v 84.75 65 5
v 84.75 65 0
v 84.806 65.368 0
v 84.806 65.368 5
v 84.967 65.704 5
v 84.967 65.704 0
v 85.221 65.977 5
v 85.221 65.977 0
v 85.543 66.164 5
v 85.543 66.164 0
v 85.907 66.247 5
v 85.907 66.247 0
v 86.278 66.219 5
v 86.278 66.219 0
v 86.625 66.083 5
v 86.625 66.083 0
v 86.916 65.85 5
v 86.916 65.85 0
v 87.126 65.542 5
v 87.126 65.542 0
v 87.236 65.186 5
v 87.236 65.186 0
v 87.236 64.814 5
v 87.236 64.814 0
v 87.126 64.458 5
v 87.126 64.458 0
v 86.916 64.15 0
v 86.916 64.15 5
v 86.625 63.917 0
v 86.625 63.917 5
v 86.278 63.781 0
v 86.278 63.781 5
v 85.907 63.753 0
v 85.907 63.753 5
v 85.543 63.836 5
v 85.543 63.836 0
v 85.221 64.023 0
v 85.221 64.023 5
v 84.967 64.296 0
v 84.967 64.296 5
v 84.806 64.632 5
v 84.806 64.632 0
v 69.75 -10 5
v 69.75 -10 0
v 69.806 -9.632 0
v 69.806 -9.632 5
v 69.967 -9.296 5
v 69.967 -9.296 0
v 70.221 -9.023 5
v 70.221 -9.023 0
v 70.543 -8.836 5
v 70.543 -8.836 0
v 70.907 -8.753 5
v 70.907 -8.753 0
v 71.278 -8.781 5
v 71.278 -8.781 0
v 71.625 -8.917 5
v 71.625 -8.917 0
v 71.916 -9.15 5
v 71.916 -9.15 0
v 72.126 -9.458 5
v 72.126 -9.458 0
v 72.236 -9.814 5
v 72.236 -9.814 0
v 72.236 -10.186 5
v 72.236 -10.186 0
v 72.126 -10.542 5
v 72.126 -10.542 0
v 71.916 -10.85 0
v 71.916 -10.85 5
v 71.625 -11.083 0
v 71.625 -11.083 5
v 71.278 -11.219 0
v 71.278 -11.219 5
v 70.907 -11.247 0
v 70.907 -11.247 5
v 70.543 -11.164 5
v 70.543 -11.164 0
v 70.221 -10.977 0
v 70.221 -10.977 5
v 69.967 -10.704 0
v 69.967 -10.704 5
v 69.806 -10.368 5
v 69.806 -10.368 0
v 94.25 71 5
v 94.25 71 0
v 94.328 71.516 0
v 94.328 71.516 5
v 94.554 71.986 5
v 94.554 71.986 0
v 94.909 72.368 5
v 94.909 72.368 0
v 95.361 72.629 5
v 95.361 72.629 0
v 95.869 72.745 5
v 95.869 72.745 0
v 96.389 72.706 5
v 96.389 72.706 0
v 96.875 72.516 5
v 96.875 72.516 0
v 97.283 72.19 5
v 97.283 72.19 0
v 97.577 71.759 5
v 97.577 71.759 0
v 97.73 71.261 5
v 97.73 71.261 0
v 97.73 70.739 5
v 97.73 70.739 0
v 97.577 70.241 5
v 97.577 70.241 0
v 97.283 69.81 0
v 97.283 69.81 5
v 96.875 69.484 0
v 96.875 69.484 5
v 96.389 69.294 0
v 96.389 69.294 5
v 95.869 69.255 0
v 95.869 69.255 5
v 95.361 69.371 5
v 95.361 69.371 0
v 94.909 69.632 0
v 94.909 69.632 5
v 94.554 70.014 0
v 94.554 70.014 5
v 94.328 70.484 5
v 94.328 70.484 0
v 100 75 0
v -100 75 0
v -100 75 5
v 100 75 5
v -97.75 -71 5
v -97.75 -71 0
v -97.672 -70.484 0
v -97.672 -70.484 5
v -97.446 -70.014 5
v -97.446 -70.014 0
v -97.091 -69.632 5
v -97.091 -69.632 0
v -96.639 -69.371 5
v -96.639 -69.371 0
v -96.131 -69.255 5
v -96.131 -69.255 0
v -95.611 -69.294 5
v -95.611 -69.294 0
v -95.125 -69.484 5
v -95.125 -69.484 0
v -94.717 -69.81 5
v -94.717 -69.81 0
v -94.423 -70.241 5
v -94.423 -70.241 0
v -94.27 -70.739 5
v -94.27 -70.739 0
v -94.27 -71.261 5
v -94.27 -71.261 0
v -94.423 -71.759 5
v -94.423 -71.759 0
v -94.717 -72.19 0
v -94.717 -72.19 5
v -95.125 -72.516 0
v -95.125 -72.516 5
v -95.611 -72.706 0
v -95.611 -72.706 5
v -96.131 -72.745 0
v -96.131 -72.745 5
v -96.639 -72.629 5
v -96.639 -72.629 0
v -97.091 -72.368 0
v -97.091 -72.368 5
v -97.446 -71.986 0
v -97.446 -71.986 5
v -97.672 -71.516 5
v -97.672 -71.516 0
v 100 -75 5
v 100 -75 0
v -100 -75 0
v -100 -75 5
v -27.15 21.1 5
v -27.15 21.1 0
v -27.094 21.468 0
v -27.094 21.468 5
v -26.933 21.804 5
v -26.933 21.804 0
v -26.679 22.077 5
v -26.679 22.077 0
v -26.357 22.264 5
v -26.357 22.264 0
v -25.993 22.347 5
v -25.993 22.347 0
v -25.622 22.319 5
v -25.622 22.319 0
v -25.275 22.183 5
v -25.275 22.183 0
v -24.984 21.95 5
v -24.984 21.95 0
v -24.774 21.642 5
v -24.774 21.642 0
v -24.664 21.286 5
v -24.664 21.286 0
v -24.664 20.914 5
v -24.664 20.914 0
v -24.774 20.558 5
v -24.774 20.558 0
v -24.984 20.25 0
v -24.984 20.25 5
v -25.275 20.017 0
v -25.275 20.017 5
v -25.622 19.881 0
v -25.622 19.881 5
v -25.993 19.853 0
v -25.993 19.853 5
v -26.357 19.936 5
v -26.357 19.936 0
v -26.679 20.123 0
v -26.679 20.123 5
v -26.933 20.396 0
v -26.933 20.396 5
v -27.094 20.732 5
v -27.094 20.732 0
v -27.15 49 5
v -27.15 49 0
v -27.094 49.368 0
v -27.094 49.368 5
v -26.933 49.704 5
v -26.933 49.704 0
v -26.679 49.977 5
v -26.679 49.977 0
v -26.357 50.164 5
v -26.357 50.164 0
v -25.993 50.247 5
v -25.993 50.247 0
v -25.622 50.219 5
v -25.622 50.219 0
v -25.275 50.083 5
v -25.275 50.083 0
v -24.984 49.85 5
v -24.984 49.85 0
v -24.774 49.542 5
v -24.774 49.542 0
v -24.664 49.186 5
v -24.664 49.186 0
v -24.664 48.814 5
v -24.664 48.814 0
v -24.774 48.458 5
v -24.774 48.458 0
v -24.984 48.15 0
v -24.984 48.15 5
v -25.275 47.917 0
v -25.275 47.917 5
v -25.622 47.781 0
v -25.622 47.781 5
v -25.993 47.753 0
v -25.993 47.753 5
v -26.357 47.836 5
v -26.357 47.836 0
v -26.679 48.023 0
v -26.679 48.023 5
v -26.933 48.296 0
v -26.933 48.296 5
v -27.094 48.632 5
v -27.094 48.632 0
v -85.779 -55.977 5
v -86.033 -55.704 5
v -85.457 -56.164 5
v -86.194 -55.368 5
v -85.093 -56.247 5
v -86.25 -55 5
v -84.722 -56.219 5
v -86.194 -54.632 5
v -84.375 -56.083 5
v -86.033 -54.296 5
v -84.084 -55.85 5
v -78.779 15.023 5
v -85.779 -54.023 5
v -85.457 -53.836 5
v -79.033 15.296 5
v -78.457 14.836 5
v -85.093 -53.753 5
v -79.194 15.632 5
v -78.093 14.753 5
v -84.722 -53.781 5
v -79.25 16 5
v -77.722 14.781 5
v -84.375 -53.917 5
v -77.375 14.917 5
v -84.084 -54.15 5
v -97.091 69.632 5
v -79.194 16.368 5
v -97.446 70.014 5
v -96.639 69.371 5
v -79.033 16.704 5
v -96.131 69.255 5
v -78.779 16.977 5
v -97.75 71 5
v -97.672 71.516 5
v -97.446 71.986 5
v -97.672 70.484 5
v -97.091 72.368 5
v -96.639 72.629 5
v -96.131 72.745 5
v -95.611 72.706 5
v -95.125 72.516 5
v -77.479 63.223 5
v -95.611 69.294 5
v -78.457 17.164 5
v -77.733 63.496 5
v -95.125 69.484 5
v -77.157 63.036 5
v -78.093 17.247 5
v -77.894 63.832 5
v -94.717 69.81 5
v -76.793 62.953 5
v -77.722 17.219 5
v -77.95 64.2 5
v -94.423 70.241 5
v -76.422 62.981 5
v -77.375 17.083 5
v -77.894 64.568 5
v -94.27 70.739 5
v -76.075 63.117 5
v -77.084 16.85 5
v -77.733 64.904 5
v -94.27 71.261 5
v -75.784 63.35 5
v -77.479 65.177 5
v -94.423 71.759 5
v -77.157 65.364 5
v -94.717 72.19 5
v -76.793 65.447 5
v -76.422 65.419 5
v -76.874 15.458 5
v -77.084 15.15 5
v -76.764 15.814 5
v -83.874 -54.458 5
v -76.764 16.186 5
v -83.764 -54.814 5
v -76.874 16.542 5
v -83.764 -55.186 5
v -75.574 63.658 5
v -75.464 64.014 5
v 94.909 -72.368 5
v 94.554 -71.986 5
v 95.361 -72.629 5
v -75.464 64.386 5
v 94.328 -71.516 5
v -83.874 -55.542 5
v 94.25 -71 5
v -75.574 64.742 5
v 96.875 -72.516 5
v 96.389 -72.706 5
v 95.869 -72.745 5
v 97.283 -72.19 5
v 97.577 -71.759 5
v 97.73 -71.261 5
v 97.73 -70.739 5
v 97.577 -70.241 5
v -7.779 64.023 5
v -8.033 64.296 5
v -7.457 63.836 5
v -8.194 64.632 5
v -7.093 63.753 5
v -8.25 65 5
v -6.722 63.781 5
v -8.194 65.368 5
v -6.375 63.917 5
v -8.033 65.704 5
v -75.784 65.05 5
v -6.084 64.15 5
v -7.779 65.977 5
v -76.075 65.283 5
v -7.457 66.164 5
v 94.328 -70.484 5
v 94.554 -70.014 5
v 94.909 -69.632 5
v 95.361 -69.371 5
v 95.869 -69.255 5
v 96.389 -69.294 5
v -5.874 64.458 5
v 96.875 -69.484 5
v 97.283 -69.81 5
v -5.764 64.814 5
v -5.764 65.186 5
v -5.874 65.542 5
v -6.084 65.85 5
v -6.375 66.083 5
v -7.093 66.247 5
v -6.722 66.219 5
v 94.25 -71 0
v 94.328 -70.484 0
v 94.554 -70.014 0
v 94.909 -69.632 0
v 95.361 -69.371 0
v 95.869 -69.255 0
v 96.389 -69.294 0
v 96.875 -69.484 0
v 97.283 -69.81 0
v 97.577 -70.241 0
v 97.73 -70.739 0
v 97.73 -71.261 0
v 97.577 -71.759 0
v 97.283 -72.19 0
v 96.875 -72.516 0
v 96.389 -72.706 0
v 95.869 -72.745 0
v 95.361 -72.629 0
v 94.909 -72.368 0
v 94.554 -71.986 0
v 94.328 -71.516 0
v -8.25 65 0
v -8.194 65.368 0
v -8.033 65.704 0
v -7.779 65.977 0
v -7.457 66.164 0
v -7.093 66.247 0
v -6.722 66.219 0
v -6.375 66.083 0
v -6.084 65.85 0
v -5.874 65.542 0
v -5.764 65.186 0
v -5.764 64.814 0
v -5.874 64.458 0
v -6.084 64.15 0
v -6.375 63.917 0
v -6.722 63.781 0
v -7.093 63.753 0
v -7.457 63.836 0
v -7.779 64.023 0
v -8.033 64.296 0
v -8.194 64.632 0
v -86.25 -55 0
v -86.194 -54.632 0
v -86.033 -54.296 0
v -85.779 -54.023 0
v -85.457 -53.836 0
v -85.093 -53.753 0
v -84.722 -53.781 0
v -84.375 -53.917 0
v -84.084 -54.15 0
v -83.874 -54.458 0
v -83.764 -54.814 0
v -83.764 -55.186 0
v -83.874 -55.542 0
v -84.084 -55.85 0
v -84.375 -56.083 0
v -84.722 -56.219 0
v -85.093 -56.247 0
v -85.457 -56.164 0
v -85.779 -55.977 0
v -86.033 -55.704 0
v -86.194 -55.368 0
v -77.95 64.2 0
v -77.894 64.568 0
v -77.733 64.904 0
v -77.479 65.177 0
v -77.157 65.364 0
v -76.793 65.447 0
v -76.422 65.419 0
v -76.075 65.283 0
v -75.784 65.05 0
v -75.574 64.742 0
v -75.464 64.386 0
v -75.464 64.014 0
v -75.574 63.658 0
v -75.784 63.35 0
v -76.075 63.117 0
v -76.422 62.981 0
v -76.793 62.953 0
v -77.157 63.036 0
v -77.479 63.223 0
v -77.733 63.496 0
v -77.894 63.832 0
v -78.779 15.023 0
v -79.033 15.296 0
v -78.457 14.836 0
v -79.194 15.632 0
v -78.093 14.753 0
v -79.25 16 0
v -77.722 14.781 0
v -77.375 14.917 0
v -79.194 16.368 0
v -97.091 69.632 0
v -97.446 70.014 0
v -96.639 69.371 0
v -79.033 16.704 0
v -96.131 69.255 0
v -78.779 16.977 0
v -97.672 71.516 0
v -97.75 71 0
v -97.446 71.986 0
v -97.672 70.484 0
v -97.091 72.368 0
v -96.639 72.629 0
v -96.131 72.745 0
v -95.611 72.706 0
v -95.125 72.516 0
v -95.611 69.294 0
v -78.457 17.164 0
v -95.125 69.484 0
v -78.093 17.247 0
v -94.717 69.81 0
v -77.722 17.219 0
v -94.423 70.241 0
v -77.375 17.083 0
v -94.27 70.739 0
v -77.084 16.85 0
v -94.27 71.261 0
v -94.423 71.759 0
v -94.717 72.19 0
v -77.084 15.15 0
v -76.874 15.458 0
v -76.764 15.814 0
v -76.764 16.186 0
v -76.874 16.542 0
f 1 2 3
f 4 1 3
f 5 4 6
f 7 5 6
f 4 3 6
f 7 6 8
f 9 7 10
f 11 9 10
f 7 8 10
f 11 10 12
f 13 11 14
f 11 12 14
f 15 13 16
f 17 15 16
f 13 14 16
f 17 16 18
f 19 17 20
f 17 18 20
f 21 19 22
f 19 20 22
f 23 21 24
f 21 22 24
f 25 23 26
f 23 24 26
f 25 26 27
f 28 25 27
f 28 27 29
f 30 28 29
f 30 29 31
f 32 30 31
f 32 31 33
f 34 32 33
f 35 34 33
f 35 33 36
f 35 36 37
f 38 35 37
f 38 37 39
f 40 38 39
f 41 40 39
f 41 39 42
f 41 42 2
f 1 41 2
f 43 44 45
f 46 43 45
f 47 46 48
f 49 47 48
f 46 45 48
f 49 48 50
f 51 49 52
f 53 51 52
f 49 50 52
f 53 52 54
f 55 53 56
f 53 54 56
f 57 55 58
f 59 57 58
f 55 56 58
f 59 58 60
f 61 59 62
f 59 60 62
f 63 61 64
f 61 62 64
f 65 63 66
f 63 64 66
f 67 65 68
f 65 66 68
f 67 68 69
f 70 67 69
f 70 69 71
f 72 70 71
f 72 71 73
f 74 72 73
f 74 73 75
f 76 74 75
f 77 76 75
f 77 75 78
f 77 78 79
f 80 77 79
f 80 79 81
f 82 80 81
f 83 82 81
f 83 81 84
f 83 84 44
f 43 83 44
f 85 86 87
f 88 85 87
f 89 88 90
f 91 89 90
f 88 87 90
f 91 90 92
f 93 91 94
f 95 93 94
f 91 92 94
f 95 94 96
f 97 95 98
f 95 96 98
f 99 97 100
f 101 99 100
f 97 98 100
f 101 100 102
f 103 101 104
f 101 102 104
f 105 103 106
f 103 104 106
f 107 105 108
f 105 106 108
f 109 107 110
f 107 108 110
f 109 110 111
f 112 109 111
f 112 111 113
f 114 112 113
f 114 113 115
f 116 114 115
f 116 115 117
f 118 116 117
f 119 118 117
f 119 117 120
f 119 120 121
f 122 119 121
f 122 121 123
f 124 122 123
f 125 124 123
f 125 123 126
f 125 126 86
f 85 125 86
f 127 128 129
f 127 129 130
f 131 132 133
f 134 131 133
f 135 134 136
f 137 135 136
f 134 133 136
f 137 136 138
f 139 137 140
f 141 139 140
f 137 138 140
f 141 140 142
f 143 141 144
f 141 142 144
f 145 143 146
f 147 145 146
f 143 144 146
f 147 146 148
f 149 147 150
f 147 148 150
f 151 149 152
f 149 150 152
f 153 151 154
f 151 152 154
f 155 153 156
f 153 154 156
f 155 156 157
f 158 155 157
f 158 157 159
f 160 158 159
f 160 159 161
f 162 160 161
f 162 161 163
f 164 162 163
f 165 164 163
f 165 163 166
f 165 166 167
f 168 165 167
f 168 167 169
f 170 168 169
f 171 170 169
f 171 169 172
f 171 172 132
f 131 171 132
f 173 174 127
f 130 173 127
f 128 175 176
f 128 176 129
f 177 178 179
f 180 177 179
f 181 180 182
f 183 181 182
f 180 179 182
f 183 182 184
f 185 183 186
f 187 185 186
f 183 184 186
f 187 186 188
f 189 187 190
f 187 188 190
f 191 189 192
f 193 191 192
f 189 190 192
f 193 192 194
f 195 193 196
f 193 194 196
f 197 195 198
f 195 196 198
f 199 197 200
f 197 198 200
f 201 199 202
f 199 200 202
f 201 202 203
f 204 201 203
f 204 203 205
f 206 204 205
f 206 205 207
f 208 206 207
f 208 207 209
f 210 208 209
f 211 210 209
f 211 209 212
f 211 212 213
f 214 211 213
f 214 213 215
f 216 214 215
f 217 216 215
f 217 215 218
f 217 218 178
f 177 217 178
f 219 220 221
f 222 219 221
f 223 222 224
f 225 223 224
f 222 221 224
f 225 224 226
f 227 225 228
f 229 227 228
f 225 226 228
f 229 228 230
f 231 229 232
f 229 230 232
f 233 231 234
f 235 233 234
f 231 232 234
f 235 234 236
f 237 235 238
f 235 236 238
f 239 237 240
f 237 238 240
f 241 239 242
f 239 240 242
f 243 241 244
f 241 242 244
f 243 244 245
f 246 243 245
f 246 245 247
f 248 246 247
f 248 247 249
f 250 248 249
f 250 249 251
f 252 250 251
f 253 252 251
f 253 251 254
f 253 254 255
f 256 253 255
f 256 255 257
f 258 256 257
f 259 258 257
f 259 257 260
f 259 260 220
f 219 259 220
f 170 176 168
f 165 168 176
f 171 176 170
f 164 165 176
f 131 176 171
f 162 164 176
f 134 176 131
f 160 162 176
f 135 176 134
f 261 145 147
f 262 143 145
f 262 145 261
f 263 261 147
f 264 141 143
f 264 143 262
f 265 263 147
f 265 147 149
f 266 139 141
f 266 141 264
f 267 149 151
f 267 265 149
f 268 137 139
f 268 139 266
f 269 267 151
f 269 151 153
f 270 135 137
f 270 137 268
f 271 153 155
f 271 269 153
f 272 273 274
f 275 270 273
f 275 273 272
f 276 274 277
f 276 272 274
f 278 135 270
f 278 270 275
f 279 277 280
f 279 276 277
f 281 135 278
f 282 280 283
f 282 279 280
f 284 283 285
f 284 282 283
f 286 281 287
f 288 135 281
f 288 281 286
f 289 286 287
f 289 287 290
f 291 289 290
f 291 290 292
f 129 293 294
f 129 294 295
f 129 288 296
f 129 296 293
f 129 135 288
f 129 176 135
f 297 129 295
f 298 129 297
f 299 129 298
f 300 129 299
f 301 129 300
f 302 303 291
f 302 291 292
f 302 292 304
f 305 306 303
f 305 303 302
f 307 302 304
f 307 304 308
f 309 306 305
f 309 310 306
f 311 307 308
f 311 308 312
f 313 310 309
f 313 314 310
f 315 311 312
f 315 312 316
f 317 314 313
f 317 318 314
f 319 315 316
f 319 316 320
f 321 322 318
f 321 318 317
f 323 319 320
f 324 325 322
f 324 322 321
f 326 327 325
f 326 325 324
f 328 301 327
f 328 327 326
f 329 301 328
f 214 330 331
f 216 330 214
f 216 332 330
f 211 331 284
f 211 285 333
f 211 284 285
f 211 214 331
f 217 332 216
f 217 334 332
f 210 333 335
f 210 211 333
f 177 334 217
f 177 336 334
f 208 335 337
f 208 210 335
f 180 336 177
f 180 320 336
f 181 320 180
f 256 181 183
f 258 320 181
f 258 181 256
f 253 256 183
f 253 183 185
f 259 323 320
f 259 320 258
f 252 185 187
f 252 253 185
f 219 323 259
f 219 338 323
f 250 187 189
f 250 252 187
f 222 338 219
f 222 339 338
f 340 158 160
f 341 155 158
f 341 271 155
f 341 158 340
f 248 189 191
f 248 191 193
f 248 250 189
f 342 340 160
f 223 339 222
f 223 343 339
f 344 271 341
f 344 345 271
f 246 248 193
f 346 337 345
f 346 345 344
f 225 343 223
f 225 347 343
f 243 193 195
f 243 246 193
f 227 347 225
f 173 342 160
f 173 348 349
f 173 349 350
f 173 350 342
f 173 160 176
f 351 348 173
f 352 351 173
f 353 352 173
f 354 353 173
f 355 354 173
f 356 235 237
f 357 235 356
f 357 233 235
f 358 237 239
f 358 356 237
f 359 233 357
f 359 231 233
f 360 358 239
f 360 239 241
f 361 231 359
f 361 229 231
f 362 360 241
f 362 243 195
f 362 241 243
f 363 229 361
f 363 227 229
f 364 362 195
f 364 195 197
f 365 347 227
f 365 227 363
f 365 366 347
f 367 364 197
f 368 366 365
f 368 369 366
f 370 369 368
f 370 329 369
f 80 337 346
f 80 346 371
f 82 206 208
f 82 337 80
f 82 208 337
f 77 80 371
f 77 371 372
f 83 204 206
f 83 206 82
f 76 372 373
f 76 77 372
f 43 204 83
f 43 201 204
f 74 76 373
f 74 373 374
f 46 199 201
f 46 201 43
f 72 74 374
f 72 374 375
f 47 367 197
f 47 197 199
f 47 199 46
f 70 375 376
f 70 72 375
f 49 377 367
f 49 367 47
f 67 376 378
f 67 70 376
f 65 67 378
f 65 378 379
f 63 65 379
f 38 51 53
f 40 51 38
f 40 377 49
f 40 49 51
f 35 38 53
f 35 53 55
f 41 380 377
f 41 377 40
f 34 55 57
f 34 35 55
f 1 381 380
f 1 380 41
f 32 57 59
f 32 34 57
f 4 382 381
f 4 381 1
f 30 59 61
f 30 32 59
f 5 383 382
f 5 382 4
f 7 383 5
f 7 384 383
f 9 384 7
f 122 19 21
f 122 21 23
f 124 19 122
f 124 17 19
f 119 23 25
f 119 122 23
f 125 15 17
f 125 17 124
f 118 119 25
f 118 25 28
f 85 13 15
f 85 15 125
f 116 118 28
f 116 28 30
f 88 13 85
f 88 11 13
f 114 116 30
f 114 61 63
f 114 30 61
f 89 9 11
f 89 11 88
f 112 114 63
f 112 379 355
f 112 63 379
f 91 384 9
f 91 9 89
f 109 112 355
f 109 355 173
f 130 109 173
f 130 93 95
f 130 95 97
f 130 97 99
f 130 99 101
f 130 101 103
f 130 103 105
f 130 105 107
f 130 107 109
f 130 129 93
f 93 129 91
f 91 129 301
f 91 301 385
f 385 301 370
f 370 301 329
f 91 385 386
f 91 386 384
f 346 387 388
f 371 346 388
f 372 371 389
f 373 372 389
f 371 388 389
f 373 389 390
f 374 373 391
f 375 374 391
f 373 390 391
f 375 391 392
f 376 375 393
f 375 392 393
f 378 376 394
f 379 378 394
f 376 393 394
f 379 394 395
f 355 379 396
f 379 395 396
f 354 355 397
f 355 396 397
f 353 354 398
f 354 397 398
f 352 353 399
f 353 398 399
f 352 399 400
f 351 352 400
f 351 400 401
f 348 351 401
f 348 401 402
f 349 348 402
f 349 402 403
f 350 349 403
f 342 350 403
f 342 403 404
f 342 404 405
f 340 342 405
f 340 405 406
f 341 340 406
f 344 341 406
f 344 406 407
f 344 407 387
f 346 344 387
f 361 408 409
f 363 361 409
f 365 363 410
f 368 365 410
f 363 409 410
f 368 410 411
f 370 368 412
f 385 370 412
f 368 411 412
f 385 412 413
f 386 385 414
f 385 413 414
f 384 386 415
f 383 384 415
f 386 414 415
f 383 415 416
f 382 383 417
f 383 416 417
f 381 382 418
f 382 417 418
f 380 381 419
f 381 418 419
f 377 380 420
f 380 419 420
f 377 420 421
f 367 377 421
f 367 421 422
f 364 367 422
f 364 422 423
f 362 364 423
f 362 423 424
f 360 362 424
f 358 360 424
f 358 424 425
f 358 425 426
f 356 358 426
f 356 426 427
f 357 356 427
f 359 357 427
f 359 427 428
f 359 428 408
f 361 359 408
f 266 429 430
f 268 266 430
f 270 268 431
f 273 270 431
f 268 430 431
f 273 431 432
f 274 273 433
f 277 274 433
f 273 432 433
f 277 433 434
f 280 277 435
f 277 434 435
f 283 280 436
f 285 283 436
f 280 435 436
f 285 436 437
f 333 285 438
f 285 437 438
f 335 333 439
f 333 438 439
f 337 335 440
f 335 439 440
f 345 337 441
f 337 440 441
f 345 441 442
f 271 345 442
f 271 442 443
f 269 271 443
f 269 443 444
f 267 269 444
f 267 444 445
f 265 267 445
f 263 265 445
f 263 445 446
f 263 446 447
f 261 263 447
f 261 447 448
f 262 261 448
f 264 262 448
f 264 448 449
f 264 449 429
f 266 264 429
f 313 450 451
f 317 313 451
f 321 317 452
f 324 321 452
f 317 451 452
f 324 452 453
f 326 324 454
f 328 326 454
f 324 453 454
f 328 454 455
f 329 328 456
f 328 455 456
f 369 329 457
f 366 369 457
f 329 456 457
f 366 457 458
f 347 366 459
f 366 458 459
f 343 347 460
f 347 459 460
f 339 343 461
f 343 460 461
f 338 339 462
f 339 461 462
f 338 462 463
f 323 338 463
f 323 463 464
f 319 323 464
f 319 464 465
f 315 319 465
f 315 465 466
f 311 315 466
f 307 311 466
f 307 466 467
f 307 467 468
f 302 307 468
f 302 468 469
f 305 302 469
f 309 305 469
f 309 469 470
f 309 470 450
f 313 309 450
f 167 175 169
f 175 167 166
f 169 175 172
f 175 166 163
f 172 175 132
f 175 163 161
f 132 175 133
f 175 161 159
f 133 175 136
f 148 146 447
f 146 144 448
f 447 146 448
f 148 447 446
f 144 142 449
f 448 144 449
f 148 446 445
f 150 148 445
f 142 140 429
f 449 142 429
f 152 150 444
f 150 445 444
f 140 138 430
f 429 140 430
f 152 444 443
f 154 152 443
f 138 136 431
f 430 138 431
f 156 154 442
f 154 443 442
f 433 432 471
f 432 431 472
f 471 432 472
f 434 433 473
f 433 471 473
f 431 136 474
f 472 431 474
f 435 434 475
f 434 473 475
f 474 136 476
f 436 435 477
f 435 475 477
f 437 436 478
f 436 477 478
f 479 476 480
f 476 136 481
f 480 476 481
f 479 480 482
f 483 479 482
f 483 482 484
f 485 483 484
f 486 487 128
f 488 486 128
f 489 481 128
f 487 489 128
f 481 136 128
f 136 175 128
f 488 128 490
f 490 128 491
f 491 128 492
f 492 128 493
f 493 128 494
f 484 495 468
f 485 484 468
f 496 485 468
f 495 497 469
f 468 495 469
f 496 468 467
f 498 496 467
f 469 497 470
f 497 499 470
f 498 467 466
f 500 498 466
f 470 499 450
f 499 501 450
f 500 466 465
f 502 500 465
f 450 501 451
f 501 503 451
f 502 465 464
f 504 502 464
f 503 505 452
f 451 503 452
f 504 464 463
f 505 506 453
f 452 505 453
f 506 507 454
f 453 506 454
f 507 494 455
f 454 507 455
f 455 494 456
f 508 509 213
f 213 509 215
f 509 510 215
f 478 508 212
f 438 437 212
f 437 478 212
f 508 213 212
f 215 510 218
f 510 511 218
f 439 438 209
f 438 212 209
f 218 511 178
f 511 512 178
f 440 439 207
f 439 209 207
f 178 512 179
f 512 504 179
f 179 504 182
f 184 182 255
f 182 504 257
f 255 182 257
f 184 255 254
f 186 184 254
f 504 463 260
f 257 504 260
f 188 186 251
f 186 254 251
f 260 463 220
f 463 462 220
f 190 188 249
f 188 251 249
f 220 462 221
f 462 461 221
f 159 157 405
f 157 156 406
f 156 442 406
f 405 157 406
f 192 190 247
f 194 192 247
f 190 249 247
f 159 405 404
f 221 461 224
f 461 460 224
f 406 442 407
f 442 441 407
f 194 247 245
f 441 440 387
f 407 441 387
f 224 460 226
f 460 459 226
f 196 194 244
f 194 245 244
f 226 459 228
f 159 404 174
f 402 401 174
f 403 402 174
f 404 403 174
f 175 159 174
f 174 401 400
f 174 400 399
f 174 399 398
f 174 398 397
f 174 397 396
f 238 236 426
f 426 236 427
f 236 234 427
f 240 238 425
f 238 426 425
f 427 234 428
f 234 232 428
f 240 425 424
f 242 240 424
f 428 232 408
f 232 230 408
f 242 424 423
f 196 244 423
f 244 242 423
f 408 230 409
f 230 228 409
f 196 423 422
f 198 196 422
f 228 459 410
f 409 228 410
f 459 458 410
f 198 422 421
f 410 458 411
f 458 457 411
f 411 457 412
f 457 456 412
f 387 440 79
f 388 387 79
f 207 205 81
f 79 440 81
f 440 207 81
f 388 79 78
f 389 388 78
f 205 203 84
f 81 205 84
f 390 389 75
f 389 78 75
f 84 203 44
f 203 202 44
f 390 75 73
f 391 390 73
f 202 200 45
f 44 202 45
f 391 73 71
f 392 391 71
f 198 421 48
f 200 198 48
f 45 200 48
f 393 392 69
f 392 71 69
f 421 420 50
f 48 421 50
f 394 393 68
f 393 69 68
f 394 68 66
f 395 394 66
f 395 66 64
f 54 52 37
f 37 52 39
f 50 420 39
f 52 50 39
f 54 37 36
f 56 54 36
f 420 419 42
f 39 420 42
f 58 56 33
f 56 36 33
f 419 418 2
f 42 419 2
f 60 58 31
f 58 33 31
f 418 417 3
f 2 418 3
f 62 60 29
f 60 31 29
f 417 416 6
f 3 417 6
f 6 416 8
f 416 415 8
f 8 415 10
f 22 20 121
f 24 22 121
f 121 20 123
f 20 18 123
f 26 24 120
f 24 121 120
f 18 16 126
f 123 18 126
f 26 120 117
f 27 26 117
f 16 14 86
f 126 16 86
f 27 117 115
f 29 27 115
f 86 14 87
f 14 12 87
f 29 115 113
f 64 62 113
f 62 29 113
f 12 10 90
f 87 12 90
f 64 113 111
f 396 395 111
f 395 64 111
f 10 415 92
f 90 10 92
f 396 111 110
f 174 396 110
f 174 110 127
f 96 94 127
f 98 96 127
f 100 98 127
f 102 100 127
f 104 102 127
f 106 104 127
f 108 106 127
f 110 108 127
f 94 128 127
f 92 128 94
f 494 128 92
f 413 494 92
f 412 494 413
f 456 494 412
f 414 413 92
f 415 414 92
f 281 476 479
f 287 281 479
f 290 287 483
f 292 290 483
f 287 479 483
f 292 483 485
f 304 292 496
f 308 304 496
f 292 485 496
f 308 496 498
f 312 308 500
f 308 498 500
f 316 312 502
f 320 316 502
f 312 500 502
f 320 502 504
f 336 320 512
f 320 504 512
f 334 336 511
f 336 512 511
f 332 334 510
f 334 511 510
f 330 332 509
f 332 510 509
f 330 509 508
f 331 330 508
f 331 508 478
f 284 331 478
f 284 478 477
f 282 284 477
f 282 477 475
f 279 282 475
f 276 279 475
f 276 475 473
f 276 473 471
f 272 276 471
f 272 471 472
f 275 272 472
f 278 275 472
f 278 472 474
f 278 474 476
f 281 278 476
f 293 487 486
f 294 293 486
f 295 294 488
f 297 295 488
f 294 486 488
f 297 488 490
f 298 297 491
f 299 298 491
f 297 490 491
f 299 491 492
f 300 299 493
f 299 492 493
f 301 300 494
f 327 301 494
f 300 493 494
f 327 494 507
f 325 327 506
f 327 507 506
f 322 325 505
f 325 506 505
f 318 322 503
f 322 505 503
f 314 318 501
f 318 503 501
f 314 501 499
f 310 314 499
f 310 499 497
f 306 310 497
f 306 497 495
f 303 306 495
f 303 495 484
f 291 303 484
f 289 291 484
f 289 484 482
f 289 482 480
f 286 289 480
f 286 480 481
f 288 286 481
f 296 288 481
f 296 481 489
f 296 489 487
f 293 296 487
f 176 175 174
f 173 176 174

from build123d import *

# Parameters (mm, degrees)
F0_W     = 200
F0_H     = 150
F0_R     = 1.6
F1_DEPTH = 5
F3_D     = 2.5
F5_D     = 3.5


with BuildPart() as f1:
    # F0 (on Top) → F1 (new body)
    with BuildSketch(Plane.XY):
        Rectangle(F0_W, F0_H)
        with Locations((-96, -71)):
            Circle(F0_R, mode=Mode.SUBTRACT)
        with Locations((96, -71)):
            Circle(F0_R, mode=Mode.SUBTRACT)
        with Locations((-96, 71)):
            Circle(F0_R, mode=Mode.SUBTRACT)
        with Locations((96, 71)):
            Circle(F0_R, mode=Mode.SUBTRACT)
    extrude(amount=F1_DEPTH)

    # F3 (through all)
    with Locations(Plane.XY.offset(5)):
        with Locations((-76.7, 64.2), (-25.9, 49), (-25.9, 21.1), (-78, 16), (-85, -55), (71, -10), (-7, 65), (86, 65)):
            Hole(F3_D / 2)

    # F5 (through all)
    with Locations(Plane.XY.offset(5)):
        with Locations((-96, -71), (-96, 71), (96, 71), (96, -71)):
            Hole(F5_D / 2)


solid = f1.part
